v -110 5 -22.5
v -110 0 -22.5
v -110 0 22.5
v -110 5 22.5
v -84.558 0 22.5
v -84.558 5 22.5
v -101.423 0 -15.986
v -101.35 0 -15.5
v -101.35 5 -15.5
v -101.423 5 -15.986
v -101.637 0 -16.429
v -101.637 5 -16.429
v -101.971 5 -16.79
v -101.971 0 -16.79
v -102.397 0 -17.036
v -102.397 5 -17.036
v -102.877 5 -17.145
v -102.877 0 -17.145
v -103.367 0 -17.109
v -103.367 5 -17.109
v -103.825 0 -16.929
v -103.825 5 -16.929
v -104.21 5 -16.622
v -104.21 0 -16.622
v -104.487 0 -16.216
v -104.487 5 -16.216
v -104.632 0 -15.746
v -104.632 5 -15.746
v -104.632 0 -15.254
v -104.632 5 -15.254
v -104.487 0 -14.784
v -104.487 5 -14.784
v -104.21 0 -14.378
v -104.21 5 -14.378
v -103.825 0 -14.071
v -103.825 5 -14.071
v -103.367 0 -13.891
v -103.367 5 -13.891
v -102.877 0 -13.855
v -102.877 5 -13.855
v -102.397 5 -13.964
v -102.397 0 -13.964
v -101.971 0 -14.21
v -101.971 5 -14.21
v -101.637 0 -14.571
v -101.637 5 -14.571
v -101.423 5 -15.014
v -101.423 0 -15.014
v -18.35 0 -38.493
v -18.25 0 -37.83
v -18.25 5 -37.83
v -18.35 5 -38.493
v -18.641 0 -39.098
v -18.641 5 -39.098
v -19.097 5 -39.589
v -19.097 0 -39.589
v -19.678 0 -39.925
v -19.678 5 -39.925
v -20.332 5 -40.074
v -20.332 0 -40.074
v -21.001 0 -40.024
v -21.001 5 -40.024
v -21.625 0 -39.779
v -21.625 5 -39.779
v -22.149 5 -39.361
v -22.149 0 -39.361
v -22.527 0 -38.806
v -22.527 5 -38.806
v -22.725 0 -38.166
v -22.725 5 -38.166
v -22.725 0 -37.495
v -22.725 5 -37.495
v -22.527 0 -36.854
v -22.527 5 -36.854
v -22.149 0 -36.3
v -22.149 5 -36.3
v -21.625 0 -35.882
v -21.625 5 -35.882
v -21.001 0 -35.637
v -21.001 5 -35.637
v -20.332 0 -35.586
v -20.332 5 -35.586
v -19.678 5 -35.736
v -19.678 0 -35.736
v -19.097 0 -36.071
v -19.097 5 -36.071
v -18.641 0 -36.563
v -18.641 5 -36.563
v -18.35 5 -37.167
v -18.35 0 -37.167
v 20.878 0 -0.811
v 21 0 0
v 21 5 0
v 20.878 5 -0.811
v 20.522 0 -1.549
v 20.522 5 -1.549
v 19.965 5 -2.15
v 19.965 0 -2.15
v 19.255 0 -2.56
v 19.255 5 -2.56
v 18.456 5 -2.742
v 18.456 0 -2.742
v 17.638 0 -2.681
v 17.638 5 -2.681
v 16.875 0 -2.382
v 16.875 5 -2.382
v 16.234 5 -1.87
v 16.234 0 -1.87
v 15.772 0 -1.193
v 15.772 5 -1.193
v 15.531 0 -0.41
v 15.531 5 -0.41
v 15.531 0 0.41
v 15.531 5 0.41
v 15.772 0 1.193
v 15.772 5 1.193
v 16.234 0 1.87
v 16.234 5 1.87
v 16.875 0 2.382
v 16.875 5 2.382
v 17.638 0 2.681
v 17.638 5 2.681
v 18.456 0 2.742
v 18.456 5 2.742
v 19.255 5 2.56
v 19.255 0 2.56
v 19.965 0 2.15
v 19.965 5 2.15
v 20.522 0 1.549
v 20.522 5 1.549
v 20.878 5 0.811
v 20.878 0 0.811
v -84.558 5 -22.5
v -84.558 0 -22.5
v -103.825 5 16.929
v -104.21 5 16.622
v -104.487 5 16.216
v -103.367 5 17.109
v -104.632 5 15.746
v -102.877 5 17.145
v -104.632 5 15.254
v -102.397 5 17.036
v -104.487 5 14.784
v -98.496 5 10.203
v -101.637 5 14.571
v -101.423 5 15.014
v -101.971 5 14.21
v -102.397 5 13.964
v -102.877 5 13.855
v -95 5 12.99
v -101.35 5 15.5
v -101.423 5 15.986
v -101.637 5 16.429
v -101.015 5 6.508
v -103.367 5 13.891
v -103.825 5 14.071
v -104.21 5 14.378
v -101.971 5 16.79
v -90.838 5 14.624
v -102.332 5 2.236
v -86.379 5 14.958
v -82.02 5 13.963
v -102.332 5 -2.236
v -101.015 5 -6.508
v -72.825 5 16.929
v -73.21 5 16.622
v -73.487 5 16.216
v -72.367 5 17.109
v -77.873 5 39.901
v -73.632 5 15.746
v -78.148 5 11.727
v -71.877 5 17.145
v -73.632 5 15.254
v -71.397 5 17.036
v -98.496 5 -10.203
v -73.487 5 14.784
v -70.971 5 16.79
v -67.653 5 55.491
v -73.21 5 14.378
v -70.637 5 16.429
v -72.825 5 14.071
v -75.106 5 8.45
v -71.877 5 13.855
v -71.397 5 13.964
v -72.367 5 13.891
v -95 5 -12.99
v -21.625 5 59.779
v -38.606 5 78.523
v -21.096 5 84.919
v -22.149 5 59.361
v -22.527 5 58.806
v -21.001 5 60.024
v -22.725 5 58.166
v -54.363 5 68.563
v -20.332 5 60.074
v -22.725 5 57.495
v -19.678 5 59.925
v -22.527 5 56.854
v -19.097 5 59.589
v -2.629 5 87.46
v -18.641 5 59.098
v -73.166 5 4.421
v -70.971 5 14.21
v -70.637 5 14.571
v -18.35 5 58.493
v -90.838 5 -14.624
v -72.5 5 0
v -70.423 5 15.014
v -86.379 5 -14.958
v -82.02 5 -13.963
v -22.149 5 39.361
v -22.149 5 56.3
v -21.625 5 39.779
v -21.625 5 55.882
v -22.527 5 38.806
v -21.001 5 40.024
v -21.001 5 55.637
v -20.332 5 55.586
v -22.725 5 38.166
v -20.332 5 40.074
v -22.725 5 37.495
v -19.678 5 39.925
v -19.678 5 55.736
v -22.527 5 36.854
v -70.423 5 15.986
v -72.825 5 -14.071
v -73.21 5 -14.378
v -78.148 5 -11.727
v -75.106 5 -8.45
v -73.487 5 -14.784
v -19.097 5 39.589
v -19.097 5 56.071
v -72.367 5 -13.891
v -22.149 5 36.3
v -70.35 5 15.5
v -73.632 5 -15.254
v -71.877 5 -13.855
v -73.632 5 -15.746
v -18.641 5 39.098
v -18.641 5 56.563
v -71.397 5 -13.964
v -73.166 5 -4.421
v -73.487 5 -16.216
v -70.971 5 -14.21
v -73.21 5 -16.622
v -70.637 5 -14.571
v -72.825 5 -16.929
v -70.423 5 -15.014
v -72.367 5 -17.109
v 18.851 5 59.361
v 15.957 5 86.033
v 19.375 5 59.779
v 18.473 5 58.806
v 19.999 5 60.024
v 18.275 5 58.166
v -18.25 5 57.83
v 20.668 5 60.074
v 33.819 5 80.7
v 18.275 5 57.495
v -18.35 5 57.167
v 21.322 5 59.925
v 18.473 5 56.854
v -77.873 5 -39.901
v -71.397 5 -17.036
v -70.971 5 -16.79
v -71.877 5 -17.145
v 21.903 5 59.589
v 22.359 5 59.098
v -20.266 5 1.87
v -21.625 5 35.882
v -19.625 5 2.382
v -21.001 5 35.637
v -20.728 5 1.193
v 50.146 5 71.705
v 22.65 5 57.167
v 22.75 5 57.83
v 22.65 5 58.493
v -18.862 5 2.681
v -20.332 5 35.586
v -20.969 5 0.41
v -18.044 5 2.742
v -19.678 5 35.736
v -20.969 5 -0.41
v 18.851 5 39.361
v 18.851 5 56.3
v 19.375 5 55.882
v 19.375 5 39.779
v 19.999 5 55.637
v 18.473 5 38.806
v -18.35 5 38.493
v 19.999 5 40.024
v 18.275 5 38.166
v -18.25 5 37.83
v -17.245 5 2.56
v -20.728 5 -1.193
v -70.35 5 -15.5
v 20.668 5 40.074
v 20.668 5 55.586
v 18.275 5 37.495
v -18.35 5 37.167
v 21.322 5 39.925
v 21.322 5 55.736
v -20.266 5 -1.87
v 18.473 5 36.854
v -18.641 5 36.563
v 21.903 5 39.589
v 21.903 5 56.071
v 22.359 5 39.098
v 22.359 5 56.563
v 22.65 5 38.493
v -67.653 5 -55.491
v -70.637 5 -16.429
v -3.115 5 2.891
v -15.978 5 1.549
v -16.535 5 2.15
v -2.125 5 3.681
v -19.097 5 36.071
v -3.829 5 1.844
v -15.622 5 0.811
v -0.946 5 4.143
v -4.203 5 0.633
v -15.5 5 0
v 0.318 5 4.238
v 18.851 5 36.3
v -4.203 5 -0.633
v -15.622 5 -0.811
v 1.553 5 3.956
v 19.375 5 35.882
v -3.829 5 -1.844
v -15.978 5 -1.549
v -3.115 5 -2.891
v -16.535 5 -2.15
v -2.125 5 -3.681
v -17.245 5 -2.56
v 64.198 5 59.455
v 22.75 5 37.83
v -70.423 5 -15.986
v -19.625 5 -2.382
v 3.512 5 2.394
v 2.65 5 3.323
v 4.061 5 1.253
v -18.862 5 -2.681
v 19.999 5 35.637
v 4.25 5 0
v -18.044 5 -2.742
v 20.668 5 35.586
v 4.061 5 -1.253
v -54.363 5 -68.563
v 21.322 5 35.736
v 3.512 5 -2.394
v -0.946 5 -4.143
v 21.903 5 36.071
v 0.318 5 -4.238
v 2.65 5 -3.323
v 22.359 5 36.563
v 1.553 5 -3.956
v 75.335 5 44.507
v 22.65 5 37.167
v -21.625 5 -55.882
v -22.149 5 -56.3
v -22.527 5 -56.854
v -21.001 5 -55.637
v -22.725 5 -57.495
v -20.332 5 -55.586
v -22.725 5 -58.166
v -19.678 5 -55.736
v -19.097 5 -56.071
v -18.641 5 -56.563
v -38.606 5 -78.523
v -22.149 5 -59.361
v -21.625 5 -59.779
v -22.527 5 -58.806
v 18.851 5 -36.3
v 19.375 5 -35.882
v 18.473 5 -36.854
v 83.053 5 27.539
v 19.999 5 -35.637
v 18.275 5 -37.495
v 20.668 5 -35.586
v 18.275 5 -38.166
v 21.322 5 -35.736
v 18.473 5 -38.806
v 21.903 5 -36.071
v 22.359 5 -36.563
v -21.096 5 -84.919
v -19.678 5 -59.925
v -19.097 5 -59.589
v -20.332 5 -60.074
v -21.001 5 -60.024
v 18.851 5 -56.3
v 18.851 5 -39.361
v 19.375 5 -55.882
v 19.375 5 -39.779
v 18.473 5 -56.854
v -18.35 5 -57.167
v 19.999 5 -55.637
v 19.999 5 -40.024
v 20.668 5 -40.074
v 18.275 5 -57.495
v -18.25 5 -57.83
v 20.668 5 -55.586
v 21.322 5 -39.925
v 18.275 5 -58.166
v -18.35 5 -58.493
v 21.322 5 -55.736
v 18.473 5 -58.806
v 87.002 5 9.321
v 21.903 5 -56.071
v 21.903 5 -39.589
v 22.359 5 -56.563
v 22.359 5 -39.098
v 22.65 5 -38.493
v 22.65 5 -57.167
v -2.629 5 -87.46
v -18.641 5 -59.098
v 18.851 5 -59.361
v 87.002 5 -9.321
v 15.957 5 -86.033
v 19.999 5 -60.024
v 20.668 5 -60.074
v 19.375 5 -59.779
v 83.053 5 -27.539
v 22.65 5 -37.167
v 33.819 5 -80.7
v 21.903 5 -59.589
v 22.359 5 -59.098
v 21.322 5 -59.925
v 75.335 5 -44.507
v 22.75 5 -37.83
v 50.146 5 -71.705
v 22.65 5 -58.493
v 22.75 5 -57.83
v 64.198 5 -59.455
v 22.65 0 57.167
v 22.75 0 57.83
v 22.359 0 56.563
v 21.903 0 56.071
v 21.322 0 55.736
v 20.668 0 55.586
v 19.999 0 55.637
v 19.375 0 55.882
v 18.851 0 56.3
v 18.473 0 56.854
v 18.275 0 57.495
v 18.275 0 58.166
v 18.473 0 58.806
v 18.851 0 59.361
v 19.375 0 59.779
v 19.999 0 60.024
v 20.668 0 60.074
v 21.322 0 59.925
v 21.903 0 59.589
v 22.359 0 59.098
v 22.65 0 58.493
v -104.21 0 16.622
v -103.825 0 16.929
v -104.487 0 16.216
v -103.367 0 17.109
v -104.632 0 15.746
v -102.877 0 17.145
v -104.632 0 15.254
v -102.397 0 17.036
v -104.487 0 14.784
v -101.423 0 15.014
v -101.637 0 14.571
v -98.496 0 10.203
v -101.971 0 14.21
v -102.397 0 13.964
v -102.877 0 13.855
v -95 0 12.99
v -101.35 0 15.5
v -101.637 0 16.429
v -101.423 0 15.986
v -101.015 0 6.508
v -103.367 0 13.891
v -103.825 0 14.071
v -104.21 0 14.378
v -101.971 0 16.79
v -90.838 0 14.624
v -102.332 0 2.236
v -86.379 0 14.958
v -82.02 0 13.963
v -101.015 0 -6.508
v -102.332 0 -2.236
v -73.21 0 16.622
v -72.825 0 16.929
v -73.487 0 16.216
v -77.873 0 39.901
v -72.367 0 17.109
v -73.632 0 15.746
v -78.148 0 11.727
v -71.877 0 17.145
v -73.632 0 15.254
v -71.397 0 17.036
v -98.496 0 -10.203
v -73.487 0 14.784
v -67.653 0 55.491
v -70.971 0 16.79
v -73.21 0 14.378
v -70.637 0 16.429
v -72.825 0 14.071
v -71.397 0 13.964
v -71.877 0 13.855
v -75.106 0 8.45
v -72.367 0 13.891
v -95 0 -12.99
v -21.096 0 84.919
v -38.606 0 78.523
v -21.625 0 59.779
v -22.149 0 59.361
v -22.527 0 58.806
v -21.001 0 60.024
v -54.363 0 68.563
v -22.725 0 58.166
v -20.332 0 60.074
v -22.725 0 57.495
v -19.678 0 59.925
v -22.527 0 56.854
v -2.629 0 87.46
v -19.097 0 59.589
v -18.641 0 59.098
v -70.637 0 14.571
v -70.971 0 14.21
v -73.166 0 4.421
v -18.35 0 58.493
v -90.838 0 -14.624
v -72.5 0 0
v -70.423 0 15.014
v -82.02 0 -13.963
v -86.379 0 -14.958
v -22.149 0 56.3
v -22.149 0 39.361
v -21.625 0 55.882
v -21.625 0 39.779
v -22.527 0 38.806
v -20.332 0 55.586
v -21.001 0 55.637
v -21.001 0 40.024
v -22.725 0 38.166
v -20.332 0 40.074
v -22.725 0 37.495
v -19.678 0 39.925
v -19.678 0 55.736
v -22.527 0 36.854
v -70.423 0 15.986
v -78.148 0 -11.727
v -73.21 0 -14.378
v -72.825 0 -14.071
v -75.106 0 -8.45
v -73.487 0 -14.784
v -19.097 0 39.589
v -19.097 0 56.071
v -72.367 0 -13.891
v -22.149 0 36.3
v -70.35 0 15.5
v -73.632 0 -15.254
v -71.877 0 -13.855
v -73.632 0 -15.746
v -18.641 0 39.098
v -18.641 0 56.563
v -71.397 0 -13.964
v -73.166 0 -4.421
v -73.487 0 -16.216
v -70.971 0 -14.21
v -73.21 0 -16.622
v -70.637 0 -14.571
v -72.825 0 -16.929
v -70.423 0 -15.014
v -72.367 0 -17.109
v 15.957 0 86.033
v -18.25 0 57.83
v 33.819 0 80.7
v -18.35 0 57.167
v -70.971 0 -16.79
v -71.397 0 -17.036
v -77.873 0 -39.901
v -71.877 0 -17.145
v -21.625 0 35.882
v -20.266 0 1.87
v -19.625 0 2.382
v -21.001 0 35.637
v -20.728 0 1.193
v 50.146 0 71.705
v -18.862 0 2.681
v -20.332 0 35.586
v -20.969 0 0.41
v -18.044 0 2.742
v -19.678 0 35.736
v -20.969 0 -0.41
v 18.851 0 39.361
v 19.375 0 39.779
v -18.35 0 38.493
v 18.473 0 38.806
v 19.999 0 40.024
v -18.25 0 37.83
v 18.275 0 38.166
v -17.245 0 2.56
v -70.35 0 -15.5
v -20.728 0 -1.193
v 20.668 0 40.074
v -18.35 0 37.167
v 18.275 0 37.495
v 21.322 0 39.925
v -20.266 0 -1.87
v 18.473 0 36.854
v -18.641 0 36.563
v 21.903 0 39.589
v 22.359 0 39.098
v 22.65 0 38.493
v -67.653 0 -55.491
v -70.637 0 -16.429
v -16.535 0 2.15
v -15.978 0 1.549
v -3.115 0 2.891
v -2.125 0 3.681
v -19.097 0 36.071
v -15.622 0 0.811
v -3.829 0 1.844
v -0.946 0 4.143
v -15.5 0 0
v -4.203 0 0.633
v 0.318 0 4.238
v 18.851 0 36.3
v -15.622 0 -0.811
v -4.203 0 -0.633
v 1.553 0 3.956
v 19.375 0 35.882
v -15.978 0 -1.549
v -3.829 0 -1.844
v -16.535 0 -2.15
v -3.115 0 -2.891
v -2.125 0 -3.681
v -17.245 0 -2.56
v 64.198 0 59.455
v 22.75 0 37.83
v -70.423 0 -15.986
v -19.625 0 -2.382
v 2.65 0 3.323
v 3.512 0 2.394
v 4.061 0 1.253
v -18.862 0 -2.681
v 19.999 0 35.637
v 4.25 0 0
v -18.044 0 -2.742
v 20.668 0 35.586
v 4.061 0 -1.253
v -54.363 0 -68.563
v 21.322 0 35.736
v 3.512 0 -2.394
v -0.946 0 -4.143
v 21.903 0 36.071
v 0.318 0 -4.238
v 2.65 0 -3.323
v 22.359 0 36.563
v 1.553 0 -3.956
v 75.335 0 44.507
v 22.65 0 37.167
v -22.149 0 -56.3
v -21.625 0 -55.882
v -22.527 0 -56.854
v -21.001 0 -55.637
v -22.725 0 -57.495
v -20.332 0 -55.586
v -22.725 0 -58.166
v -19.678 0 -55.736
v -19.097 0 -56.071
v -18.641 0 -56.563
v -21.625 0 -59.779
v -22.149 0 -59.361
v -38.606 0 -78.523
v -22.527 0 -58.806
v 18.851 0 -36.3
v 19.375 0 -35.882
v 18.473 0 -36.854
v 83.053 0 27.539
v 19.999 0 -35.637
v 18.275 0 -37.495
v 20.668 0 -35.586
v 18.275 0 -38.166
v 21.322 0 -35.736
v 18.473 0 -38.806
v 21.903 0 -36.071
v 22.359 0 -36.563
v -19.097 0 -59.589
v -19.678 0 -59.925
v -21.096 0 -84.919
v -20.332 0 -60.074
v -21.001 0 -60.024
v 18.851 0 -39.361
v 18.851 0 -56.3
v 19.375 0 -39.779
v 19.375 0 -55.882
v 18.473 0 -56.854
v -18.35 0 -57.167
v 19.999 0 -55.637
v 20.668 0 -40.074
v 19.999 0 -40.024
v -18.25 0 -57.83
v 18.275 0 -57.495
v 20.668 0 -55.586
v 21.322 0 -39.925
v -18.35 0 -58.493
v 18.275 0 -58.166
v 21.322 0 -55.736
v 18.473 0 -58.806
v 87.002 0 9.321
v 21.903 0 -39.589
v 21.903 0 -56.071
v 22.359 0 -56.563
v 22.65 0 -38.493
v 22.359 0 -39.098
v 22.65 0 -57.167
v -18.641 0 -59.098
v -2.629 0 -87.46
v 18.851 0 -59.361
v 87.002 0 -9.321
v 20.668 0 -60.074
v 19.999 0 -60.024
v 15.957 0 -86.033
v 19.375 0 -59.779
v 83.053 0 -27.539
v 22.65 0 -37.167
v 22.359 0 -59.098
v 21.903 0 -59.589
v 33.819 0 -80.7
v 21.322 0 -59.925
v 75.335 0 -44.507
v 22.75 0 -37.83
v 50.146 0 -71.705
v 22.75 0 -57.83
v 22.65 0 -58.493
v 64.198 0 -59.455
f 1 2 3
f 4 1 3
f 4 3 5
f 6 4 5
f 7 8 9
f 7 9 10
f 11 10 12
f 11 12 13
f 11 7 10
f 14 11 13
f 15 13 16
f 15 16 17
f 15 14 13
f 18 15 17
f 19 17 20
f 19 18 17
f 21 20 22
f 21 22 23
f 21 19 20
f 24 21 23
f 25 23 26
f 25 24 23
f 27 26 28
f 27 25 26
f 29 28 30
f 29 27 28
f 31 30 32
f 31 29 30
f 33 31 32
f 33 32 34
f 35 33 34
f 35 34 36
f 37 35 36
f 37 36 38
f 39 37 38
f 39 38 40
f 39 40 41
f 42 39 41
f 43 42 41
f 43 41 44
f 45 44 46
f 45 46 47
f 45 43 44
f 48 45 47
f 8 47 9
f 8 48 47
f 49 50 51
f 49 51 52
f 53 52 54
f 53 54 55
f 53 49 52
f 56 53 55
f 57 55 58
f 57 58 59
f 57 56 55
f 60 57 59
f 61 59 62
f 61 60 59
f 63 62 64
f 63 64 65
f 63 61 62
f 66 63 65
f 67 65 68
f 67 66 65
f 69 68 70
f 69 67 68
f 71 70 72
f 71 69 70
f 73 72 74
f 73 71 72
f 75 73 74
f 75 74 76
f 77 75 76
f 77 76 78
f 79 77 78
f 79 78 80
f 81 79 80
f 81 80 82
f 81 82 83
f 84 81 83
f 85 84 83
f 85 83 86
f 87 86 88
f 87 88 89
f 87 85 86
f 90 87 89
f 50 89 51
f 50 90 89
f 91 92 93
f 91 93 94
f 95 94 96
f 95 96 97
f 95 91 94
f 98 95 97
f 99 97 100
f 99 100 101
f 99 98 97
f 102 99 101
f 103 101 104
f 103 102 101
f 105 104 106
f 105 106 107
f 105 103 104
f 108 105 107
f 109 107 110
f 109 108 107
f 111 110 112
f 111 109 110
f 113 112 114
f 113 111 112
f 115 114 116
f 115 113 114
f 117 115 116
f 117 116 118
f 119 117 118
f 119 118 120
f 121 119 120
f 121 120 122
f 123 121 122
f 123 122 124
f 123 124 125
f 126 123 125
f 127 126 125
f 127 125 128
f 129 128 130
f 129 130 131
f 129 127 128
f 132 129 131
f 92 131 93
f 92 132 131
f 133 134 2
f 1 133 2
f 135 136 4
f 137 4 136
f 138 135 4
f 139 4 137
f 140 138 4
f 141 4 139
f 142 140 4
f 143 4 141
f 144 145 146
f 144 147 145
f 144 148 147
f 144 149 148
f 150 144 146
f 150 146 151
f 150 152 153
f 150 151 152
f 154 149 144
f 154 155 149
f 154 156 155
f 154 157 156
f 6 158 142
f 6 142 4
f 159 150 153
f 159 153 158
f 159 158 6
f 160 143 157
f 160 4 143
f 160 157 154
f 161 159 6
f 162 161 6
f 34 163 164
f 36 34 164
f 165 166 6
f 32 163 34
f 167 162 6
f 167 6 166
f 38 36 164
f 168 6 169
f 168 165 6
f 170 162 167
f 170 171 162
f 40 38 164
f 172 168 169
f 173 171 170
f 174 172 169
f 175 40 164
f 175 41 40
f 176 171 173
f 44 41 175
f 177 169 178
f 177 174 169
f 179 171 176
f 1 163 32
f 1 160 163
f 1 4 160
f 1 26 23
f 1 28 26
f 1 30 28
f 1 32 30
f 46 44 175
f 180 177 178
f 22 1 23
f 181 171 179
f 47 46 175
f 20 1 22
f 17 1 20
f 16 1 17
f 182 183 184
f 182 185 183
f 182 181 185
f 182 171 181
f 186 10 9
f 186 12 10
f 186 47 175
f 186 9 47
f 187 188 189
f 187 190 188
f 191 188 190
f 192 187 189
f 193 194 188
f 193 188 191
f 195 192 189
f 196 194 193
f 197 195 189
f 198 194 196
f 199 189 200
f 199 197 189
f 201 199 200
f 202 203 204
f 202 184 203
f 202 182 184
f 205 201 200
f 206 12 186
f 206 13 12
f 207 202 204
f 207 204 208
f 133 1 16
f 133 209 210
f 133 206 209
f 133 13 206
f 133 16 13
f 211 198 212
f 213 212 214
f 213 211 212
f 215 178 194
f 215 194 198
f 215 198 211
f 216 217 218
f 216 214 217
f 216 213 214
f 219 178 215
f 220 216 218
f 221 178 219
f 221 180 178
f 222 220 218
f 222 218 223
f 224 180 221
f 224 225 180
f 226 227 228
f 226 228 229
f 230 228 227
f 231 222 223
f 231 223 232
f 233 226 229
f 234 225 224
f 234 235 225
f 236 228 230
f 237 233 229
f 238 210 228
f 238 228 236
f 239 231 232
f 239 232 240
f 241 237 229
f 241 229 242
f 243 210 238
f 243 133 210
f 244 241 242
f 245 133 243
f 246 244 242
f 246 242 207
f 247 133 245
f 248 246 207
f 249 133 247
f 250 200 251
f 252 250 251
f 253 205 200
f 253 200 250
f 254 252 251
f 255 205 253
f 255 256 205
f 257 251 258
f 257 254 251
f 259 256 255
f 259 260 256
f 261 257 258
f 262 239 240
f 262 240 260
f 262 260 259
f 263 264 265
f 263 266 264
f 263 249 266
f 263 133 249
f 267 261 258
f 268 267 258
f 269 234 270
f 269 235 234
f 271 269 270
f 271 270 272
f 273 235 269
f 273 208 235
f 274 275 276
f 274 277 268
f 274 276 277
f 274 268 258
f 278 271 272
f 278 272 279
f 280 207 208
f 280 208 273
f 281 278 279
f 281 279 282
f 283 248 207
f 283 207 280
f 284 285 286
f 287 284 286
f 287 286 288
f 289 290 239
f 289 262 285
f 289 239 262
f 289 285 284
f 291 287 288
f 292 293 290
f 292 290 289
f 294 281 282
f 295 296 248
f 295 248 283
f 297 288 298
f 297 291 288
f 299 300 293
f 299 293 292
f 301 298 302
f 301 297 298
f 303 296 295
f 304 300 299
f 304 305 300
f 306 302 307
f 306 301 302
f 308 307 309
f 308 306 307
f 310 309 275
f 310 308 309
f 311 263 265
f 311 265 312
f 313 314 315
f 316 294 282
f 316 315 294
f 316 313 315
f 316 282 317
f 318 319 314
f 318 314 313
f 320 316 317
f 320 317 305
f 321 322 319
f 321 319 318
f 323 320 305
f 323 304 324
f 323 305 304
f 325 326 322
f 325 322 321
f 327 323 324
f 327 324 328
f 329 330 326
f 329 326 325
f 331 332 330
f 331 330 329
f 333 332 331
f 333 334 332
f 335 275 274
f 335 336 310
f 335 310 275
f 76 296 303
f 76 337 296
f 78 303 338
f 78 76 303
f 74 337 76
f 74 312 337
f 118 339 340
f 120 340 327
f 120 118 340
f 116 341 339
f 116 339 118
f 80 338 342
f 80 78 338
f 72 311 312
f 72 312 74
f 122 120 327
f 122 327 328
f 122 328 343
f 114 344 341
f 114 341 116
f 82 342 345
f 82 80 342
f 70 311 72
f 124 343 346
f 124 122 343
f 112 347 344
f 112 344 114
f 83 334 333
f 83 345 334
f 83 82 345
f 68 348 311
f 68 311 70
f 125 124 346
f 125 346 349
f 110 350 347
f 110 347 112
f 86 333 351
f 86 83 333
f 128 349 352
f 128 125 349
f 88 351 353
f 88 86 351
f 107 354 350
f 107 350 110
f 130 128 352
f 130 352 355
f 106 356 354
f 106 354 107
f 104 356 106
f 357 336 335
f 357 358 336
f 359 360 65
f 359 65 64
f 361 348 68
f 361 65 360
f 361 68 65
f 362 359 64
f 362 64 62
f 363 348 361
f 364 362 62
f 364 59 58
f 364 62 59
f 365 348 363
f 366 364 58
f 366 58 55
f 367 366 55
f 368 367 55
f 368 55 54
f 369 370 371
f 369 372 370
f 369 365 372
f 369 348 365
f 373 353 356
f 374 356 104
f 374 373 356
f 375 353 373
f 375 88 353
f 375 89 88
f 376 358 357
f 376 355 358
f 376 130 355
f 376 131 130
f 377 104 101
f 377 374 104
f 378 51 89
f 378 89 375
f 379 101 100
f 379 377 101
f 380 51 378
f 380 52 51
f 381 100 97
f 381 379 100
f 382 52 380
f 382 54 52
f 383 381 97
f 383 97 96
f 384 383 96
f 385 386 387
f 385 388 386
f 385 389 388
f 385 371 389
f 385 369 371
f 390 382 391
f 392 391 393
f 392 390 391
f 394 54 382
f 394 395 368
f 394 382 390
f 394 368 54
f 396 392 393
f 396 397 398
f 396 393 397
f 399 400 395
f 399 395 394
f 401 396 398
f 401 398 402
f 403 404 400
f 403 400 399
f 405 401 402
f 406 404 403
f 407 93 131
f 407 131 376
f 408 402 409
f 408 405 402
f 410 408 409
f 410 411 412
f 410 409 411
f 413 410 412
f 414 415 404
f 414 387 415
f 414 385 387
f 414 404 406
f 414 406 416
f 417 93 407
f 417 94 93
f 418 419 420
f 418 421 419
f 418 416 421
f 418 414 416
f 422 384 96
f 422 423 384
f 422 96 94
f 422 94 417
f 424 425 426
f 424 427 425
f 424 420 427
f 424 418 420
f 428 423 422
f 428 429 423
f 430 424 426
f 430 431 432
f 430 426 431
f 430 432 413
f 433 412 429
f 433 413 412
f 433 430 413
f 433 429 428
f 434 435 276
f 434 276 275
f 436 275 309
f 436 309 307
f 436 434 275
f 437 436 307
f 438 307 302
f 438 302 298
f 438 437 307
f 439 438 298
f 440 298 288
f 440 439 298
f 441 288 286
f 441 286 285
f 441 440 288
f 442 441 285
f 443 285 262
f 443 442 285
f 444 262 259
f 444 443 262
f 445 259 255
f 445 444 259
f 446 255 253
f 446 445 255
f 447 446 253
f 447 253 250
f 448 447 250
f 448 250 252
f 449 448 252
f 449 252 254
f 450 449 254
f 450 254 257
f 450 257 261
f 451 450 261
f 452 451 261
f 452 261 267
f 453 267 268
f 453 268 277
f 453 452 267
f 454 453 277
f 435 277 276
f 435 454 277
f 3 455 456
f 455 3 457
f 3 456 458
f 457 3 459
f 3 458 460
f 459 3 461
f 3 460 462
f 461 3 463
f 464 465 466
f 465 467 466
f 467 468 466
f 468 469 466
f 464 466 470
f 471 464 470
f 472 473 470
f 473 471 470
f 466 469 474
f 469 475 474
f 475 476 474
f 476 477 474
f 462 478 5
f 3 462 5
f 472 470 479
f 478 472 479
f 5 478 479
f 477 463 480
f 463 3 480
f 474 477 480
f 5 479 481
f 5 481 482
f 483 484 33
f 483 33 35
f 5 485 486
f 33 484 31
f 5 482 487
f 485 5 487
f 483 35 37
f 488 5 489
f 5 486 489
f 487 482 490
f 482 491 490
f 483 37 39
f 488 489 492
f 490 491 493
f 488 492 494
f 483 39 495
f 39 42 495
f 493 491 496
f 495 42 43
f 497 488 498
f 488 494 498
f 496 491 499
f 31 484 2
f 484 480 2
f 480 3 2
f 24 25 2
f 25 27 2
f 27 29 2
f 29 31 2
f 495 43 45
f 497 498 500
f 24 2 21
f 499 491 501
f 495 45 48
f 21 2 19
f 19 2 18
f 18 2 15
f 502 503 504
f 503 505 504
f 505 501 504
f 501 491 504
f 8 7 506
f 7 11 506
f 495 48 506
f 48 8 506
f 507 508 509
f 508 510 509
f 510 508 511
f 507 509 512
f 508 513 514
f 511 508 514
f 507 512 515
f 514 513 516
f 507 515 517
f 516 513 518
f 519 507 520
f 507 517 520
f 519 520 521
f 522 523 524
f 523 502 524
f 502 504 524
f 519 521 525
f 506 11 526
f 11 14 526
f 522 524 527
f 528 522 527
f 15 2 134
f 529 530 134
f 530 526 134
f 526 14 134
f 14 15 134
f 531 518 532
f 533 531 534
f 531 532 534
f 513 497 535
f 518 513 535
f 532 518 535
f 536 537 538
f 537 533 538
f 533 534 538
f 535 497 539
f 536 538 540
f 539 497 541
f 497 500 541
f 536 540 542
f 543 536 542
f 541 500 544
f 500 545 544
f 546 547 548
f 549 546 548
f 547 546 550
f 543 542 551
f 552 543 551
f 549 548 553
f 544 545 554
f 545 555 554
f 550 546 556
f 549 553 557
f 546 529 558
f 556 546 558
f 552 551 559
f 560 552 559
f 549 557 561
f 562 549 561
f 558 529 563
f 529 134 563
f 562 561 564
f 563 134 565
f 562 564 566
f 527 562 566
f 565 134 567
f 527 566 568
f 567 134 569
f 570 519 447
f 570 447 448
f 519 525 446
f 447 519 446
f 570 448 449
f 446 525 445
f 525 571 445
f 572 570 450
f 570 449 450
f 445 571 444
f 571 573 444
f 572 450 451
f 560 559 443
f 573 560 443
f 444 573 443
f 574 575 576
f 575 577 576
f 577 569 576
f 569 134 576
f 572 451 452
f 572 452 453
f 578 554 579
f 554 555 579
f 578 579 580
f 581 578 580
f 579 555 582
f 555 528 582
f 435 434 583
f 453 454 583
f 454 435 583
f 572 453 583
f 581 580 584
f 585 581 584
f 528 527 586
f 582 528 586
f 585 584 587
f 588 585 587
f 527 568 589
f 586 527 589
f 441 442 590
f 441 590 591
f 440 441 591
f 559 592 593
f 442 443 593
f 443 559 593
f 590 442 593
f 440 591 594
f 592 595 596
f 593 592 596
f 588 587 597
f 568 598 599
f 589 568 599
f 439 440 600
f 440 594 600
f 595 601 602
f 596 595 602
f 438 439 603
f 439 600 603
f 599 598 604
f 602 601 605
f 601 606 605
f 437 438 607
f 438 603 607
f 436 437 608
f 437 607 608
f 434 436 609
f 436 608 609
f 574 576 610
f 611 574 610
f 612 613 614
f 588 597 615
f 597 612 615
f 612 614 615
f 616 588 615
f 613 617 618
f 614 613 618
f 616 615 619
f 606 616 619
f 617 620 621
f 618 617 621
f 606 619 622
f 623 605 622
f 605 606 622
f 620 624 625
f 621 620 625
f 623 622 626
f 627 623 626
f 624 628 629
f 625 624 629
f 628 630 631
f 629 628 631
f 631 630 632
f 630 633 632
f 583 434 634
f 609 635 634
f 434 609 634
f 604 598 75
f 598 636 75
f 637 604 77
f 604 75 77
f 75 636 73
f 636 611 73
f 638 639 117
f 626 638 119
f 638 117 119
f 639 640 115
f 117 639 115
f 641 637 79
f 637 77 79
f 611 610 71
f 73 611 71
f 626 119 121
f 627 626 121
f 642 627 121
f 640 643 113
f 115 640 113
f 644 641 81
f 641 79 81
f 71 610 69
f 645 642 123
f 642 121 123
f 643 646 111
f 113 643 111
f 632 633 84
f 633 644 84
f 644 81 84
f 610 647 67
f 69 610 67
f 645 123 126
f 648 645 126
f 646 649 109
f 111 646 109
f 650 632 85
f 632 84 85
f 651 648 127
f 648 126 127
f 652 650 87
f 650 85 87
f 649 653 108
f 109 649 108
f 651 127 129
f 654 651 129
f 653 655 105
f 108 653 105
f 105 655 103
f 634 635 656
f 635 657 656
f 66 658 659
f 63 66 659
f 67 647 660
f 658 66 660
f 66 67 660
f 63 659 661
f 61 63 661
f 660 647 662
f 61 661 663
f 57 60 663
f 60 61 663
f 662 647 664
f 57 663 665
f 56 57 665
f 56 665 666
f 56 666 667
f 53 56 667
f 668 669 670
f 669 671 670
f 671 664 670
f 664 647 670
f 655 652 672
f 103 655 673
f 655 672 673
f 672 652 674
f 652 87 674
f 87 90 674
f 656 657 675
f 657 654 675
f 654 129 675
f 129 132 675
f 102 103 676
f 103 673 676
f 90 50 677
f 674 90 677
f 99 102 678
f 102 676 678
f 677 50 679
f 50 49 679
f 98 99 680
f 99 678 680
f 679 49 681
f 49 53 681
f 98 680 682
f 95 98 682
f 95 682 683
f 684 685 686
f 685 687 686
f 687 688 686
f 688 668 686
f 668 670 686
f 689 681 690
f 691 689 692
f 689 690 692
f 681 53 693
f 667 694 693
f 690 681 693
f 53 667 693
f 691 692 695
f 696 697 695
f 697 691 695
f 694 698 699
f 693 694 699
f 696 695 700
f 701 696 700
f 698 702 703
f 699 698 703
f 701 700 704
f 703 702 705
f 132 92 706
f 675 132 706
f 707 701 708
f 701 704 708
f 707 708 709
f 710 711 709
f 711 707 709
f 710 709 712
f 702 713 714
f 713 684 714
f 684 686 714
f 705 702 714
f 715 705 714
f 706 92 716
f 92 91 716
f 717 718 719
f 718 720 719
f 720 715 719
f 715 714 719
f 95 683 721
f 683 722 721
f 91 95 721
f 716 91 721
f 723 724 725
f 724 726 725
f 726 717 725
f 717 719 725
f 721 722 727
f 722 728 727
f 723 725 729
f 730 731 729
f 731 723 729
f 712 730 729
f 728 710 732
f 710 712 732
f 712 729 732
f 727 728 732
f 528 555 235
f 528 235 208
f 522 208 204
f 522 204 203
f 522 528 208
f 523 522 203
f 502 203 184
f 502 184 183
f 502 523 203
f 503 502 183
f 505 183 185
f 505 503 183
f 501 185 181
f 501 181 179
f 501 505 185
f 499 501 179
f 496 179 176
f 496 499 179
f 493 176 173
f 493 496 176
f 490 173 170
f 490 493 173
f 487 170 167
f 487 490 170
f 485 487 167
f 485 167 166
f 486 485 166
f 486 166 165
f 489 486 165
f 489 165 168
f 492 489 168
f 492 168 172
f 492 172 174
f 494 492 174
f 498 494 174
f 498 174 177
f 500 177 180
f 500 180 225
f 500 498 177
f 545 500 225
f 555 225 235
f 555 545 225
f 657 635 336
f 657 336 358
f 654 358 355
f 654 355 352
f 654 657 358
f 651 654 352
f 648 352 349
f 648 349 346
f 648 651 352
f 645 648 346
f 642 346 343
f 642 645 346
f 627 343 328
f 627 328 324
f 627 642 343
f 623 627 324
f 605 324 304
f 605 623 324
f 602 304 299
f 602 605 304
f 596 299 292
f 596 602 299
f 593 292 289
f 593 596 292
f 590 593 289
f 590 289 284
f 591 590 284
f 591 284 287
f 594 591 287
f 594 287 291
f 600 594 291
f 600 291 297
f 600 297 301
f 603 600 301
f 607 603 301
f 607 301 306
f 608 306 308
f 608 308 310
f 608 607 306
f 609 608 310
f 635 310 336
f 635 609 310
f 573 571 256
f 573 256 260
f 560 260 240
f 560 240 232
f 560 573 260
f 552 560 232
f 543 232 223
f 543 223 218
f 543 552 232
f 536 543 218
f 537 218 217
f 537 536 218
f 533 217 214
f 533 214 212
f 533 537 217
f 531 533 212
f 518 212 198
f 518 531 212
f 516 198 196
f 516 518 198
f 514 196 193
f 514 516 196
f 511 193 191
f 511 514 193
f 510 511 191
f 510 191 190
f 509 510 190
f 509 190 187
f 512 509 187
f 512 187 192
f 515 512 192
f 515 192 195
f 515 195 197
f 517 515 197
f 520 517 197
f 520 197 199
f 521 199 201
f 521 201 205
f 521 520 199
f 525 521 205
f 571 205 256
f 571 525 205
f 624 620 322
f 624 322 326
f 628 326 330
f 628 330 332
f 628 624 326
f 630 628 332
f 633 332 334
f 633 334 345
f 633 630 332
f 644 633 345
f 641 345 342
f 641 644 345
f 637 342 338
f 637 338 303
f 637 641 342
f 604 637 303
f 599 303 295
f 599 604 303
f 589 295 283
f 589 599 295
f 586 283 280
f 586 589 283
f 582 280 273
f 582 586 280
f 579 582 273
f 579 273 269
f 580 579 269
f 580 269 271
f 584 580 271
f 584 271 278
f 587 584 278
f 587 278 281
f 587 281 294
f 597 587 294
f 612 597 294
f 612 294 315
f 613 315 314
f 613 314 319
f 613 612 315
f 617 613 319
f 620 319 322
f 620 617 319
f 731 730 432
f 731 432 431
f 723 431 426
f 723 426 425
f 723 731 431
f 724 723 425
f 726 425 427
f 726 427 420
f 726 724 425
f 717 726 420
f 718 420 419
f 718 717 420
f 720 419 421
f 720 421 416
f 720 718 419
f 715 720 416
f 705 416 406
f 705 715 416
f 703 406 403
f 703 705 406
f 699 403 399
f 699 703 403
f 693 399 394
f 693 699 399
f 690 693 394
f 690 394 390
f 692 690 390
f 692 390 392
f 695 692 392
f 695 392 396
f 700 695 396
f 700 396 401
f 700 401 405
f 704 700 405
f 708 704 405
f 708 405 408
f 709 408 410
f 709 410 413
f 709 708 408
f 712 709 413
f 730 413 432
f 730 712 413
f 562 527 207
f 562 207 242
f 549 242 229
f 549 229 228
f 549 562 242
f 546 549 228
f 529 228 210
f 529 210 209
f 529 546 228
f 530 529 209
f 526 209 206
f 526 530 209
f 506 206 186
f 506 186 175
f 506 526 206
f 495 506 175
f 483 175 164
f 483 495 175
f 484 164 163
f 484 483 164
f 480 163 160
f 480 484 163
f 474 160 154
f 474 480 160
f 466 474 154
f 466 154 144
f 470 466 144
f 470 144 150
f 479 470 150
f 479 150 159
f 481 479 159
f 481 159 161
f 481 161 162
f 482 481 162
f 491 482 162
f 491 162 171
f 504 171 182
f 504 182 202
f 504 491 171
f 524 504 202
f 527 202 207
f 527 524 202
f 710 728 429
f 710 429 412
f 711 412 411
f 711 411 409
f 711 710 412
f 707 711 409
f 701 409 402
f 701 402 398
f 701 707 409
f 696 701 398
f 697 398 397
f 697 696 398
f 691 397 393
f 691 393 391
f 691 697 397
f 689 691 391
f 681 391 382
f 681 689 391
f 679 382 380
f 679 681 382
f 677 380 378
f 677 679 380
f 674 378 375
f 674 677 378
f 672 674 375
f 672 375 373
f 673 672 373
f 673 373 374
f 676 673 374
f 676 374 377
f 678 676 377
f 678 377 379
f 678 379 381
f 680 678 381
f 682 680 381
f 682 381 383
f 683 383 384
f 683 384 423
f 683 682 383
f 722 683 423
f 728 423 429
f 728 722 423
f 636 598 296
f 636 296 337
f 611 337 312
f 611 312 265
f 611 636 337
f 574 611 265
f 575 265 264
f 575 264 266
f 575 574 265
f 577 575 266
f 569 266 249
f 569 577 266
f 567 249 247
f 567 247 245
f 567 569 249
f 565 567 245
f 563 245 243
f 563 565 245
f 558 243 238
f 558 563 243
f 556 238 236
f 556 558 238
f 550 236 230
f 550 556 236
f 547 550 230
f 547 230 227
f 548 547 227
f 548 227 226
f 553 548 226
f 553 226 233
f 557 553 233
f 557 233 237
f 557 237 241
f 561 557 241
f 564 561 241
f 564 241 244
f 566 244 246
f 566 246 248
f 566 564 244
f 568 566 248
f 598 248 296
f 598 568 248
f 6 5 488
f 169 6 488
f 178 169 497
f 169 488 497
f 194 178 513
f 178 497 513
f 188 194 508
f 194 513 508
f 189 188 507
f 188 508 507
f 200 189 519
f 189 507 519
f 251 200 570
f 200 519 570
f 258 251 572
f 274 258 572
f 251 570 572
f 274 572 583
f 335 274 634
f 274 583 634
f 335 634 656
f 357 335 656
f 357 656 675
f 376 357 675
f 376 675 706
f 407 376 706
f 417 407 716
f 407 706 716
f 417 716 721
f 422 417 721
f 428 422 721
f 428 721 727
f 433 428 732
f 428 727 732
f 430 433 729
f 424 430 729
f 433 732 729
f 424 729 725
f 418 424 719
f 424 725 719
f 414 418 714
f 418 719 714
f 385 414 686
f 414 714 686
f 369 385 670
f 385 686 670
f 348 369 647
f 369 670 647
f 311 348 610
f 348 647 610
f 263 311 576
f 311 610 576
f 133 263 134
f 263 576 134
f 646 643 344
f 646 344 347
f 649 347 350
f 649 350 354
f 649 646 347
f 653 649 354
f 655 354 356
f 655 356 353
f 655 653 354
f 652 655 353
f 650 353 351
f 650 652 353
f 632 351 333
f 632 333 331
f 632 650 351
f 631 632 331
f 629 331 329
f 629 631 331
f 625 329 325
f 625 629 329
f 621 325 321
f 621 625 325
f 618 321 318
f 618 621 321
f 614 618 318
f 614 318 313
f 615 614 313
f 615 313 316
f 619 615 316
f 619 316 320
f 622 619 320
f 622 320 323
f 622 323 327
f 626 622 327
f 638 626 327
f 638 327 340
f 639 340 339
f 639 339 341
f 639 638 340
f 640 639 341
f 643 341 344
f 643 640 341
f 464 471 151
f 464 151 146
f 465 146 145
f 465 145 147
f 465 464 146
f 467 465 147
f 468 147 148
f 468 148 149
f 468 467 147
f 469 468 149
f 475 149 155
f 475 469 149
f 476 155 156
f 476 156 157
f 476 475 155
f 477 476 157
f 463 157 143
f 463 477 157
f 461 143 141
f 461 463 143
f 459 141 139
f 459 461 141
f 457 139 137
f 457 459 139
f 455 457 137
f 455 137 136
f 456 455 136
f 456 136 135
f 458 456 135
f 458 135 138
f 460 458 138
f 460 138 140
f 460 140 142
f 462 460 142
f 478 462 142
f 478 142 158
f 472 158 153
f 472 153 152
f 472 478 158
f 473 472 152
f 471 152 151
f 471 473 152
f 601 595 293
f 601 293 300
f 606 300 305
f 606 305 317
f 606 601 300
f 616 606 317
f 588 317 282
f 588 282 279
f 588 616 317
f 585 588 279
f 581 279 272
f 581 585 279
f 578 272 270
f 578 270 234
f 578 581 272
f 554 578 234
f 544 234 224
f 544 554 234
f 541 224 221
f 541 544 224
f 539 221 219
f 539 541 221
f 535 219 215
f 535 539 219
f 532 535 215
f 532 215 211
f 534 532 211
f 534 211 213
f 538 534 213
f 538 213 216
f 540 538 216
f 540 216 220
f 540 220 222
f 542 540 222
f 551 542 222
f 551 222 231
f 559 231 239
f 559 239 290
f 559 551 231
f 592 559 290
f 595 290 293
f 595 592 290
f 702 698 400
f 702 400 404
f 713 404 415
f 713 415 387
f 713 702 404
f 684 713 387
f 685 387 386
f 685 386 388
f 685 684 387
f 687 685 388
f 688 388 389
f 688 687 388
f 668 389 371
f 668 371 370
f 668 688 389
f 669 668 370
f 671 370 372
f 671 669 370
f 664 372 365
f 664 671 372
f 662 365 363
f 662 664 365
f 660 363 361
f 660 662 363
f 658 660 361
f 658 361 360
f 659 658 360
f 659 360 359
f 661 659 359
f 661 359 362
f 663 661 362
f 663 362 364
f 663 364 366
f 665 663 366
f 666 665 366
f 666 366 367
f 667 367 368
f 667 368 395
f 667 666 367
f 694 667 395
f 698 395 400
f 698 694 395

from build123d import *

# Parameters (mm, degrees)
SKETCH2_R           = 1.65
SKETCH2_R_2         = 2.25
SKETCH2_R_3         = 15
SKETCH2_R_4         = 2.75
SKETCH2_R_5         = 4.25
BOSS_EXTRUDE3_DEPTH = 5


with BuildPart() as part:
    # Sketch2 → Boss-Extrude3 (new body)
    with BuildSketch(Plane(origin=(0, 0, 0), x_dir=(1, 0, 0), z_dir=(0, 1, 0))):
        with BuildLine():
            Line((-84.557672626, 22.5), (-110, 22.5))
            Line((-110, 22.5), (-110, -22.5))
            Line((-110, -22.5), (-84.557672626, -22.5))
            ThreePointArc((-84.557672626, -22.5), (87.5, 0), (-84.557672626, 22.5))
        make_face()
        with Locations((-103, -15.5)):
            Circle(SKETCH2_R, mode=Mode.SUBTRACT)
        with Locations((-72, -15.5)):
            Circle(SKETCH2_R, mode=Mode.SUBTRACT)
        with Locations((-20.5, -57.830207885)):
            Circle(SKETCH2_R_2, mode=Mode.SUBTRACT)
        with Locations((-20.5, -37.830207885)):
            Circle(SKETCH2_R_2, mode=Mode.SUBTRACT)
        with Locations((20.5, -37.830207885)):
            Circle(SKETCH2_R_2, mode=Mode.SUBTRACT)
        with Locations((-87.5, 0)):
            Circle(SKETCH2_R_3, mode=Mode.SUBTRACT)
        with Locations((-103, 15.5)):
            Circle(SKETCH2_R, mode=Mode.SUBTRACT)
        with Locations((-72, 15.5)):
            Circle(SKETCH2_R, mode=Mode.SUBTRACT)
        with Locations((-18.25, 0)):
            Circle(SKETCH2_R_4, mode=Mode.SUBTRACT)
        Circle(SKETCH2_R_5, mode=Mode.SUBTRACT)
        with Locations((18.25, 0)):
            Circle(SKETCH2_R_4, mode=Mode.SUBTRACT)
        with Locations((-20.5, 37.830207885)):
            Circle(SKETCH2_R_2, mode=Mode.SUBTRACT)
        with Locations((-20.5, 57.830207885)):
            Circle(SKETCH2_R_2, mode=Mode.SUBTRACT)
        with Locations((20.5, 37.830207885)):
            Circle(SKETCH2_R_2, mode=Mode.SUBTRACT)
        with Locations((20.5, 57.830207885)):
            Circle(SKETCH2_R_2, mode=Mode.SUBTRACT)
        with Locations((20.5, -57.830207885)):
            Circle(SKETCH2_R_2, mode=Mode.SUBTRACT)
    extrude(amount=BOSS_EXTRUDE3_DEPTH)


solid = part.part
